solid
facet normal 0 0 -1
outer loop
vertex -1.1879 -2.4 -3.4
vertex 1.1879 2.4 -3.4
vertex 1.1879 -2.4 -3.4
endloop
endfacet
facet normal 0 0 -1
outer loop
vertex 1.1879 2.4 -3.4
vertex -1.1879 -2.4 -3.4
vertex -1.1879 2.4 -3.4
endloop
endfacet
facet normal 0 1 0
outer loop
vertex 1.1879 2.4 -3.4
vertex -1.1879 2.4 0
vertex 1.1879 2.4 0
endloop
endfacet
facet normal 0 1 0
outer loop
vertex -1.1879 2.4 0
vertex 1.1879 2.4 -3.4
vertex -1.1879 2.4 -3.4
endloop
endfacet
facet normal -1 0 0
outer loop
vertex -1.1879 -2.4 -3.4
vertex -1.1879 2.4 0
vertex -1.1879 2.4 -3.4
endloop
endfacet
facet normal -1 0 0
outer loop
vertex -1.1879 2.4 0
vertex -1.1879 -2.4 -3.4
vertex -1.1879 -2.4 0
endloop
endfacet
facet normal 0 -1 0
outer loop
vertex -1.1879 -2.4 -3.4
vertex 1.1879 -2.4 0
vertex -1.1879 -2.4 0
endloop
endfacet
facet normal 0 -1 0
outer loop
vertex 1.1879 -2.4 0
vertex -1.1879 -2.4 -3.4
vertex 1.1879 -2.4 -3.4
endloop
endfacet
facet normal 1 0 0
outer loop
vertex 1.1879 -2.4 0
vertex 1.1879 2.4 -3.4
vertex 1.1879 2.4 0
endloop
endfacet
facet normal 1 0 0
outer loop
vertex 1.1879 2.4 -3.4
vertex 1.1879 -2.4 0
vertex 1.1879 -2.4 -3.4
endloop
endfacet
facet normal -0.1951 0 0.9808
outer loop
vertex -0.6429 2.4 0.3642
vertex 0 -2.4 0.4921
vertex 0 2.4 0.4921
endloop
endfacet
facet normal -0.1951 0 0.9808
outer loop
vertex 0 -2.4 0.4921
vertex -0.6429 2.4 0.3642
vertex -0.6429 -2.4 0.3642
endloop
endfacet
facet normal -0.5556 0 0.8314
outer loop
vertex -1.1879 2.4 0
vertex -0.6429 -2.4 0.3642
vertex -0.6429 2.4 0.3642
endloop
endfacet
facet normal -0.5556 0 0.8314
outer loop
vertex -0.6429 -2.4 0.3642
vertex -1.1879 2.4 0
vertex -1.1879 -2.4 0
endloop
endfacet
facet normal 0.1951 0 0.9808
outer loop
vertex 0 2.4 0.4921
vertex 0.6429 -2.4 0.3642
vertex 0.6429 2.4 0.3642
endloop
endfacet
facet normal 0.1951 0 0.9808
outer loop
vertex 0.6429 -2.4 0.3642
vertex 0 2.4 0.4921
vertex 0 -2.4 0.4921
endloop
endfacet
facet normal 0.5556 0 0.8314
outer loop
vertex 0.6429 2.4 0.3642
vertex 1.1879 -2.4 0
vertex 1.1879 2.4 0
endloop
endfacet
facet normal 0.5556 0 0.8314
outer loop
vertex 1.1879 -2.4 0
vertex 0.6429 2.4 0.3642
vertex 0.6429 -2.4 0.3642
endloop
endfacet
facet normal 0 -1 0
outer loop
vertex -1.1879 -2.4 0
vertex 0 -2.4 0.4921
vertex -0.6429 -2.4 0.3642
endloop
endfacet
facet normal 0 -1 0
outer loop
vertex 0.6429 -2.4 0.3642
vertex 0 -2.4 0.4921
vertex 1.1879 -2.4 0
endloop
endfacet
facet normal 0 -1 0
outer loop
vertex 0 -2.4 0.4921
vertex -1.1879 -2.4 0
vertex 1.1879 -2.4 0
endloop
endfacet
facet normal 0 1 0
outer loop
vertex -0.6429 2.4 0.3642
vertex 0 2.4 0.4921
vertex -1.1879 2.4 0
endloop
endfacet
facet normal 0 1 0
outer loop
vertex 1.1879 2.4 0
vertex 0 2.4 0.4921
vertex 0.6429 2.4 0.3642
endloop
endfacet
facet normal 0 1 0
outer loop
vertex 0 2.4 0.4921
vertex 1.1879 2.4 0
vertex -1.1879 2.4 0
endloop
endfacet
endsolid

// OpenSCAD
// file: ../p/1-8edge.scad
use <../lib.scad>
function ldraw_lib__1_8edge() = [
// 0 Circle 0.125
// 0 Name: 1-8edge.dat
// 0 Author: James Jessiman
// 0 !LDRAW_ORG Primitive UPDATE 2017-01
// 0 !LICENSE Licensed under CC BY 2.0 and CC BY 4.0 : see CAreadme.txt
// 
// 0 BFC CERTIFY CCW
  [0,"BFC","CERTIFY"],
  [0,"BFC","CCW"],
// 
// 0 !HISTORY 2007-06-22 [PTadmin] Header formatted for Contributor Agreement
// 0 !HISTORY 2008-07-01 [PTadmin] Official Update 2008-01
// 0 !HISTORY 2017-01-15 [Steffen] BFCed
// 0 !HISTORY 2017-12-30 [PTadmin] Official Update 2017-01
// 
// 
// 2 24 1 0 0 0.9239 0 0.3827
  [2,24,1,0,0,0.9239,0,0.3827],
// 2 24 0.9239 0 0.3827 0.7071 0 0.7071
  [2,24,0.9239,0,0.3827,0.7071,0,0.7071],
];
module ldraw_lib__1_8edge(step=0, col=false, unit=2/5, alt=false, line=0.2, solid=!$preview)
    makepoly(ldraw_lib__1_8edge(), step=step, col=col, unit=unit, alt=alt, line=line, solid=solid);
ldraw_lib__1_8edge(line=0.2);
// file: ../p/1-8cyli.scad
use <../lib.scad>
function ldraw_lib__1_8cyli() = [
// 0 Cylinder 0.125
// 0 Name: 1-8cyli.dat
// 0 Author: James Jessiman
// 0 !LDRAW_ORG Primitive UPDATE 2005-01
// 0 !LICENSE Licensed under CC BY 2.0 and CC BY 4.0 : see CAreadme.txt
// 
// 0 BFC CERTIFY CCW
  [0,"BFC","CERTIFY"],
  [0,"BFC","CCW"],
// 
// 0 !HISTORY 2002-04-25 [PTadmin] Official Update 2002-02
// 0 !HISTORY 2004-12-11 [nielsk] Recreated using Primitive Generator, Edge lines fixed, BFC changed to CCW
// 0 !HISTORY 2005-12-28 [PTadmin] Official Update 2005-01
// 0 !HISTORY 2007-06-22 [PTadmin] Header formatted for Contributor Agreement
// 0 !HISTORY 2008-07-01 [PTadmin] Official Update 2008-01
// 
// 
// 4 16 .9239 1 .3827 .9239 0 .3827 1 0 0 1 1 0
  [4,16,.9239,1,.3827,.9239,0,.3827,1,0,0,1,1,0],
// 4 16 .7071 1 .7071 .7071 0 .7071 .9239 0 .3827 .9239 1 .3827
  [4,16,.7071,1,.7071,.7071,0,.7071,.9239,0,.3827,.9239,1,.3827],
// 5 24 1 1 0 1 0 0 1 1 -.4142 .9239 1 .3827
  [5,24,1,1,0,1,0,0,1,1,-.4142,.9239,1,.3827],
// 5 24 .9239 1 .3827 .9239 0 .3827 1 1 0 .7071 1 .7071
  [5,24,.9239,1,.3827,.9239,0,.3827,1,1,0,.7071,1,.7071],
// 5 24 .7071 1 .7071 .7071 0 .7071 .9239 1 .3827 .4142 1 1
  [5,24,.7071,1,.7071,.7071,0,.7071,.9239,1,.3827,.4142,1,1],
// 0
];
module ldraw_lib__1_8cyli(step=0, col=false, unit=2/5, alt=false, line=0.2, solid=!$preview)
    makepoly(ldraw_lib__1_8cyli(), step=step, col=col, unit=unit, alt=alt, line=line, solid=solid);
ldraw_lib__1_8cyli(line=0.2);
// file: ../p/box5-2p.scad
use <../lib.scad>
function ldraw_lib__box5_2p() = [
// 0 Box with 5 Faces without 2 Parallel Edges
// 0 Name: box5-2p.dat
// 0 Author: Joerg Sommerer [Brickaneer]
// 0 !LDRAW_ORG Primitive UPDATE 2012-01
// 0 !LICENSE Licensed under CC BY 2.0 and CC BY 4.0 : see CAreadme.txt
// 
// 0 BFC CERTIFY CCW
  [0,"BFC","CERTIFY"],
  [0,"BFC","CCW"],
// 
// 0 !HISTORY 2012-03-30 [PTadmin] Official Update 2012-01
// 
// 
// 2 24 1 1 1 -1 1 1
  [2,24,1,1,1,-1,1,1],
// 2 24 -1 1 1 -1 1 -1
  [2,24,-1,1,1,-1,1,-1],
// 2 24 -1 1 -1 1 1 -1
  [2,24,-1,1,-1,1,1,-1],
// 2 24 1 1 -1 1 1 1
  [2,24,1,1,-1,1,1,1],
// 2 24 1 0 1 1 1 1
  [2,24,1,0,1,1,1,1],
// 2 24 -1 0 1 -1 1 1
  [2,24,-1,0,1,-1,1,1],
// 2 24 1 0 -1 1 1 -1
  [2,24,1,0,-1,1,1,-1],
// 2 24 -1 0 -1 -1 1 -1
  [2,24,-1,0,-1,-1,1,-1],
// 2 24 -1 0 1 -1 0 -1
  [2,24,-1,0,1,-1,0,-1],
// 2 24 1 0 -1 1 0 1
  [2,24,1,0,-1,1,0,1],
// 4 16 1 1 -1 -1 1 -1 -1 1 1 1 1 1
  [4,16,1,1,-1,-1,1,-1,-1,1,1,1,1,1],
// 4 16 -1 1 1 -1 0 1 1 0 1 1 1 1
  [4,16,-1,1,1,-1,0,1,1,0,1,1,1,1],
// 4 16 -1 1 -1 -1 0 -1 -1 0 1 -1 1 1
  [4,16,-1,1,-1,-1,0,-1,-1,0,1,-1,1,1],
// 4 16 1 1 -1 1 0 -1 -1 0 -1 -1 1 -1
  [4,16,1,1,-1,1,0,-1,-1,0,-1,-1,1,-1],
// 4 16 1 1 1 1 0 1 1 0 -1 1 1 -1
  [4,16,1,1,1,1,0,1,1,0,-1,1,1,-1],
];
module ldraw_lib__box5_2p(step=0, col=false, unit=2/5, alt=false, line=0.2, solid=!$preview)
    makepoly(ldraw_lib__box5_2p(), step=step, col=col, unit=unit, alt=alt, line=line, solid=solid);
ldraw_lib__box5_2p(line=0.2);
// file: ../p/1-8cylo.scad
use <../lib.scad>
use <1-8cyli.scad>
use <1-8edge.scad>
function ldraw_lib__1_8cylo() = [
// 0 Cylinder Open 0.125
// 0 Name: 1-8cylo.dat
// 0 Author: Tim Gould [timgould]
// 0 !LDRAW_ORG Primitive UPDATE 2012-03
// 0 !LICENSE Licensed under CC BY 2.0 and CC BY 4.0 : see CAreadme.txt
// 
// 0 BFC CERTIFY CCW
  [0,"BFC","CERTIFY"],
  [0,"BFC","CCW"],
// 
// 0 !HISTORY 2012-12-28 [PTadmin] Official Update 2012-03
// 
// 
// 1 16 0 0 0 1 0 0 0 1 0 0 0 1 1-8edge.dat
  [1,16,0,0,0,1,0,0,0,1,0,0,0,1, ldraw_lib__1_8edge()],
// 1 16 0 1 0 1 0 0 0 1 0 0 0 1 1-8edge.dat
  [1,16,0,1,0,1,0,0,0,1,0,0,0,1, ldraw_lib__1_8edge()],
// 1 16 0 0 0 1 0 0 0 1 0 0 0 1 1-8cyli.dat
  [1,16,0,0,0,1,0,0,0,1,0,0,0,1, ldraw_lib__1_8cyli()],
];
module ldraw_lib__1_8cylo(step=0, col=false, unit=2/5, alt=false, line=0.2, solid=!$preview)
    makepoly(ldraw_lib__1_8cylo(), step=step, col=col, unit=unit, alt=alt, line=line, solid=solid);
ldraw_lib__1_8cylo(line=0.2);
// file: ../p/1-8chrd.scad
use <../lib.scad>
function ldraw_lib__1_8chrd() = [
// 0 Chord 0.125
// 0 Name: 1-8chrd.dat
// 0 Author: Andy Westrate [westrate]
// 0 !LDRAW_ORG Primitive UPDATE 2004-02
// 0 !LICENSE Licensed under CC BY 2.0 and CC BY 4.0 : see CAreadme.txt
// 
// 0 BFC CERTIFY CCW
  [0,"BFC","CERTIFY"],
  [0,"BFC","CCW"],
// 
// 0 !HISTORY 2004-04-22 [PTadmin] Official Update 2004-02
// 0 !HISTORY 2007-06-22 [PTadmin] Header formatted for Contributor Agreement
// 0 !HISTORY 2008-07-01 [PTadmin] Official Update 2008-01
// 
// 
// 3 16 0.7071 0 0.7071 1 0 0 0.9239 0 0.3827
  [3,16,0.7071,0,0.7071,1,0,0,0.9239,0,0.3827],
// 
// 0
];
module ldraw_lib__1_8chrd(step=0, col=false, unit=2/5, alt=false, line=0.2, solid=!$preview)
    makepoly(ldraw_lib__1_8chrd(), step=step, col=col, unit=unit, alt=alt, line=line, solid=solid);
ldraw_lib__1_8chrd(line=0.2);
// main file
use <../lib.scad>
use <../p/1-8chrd.scad>
use <../p/1-8cylo.scad>
use <../p/box5-2p.scad>
function ldraw_lib__t1069() = [
// 0 ~| Circuit Cubes NO/NC Switch Button
// 0 Name: t1069.dat
// 0 Author: Philippe Hurbain [Philo]
// 0 !LDRAW_ORG Part UPDATE 2022-05
// 0 !LICENSE Licensed under CC BY 2.0 and CC BY 4.0 : see CAreadme.txt
// 
// 0 BFC CERTIFY CCW
  [0,"BFC","CERTIFY"],
  [0,"BFC","CCW"],
// 
// 0 !CATEGORY Electric
// 
// 0 !HISTORY 2022-09-15 [PTadmin] Official Update 2022-05
// 
// 
// 1 16 0 0 0 2.96982 0 0 0 8.5 0 0 0 6 box5-2p.dat
  [1,16,0,0,0,2.96982,0,0,0,8.5,0,0,0,6, ldraw_lib__box5_2p()],
// 1 16 0 2.9698 -6 0 0 -4.2 -4.2 0 0 0 12 0 1-8cylo.dat
  [1,16,0,2.9698,-6,0,0,-4.2,-4.2,0,0,0,12,0, ldraw_lib__1_8cylo()],
// 1 16 0 2.9698 -6 0 0 4.2 -4.2 0 0 0 12 0 1-8cylo.dat
  [1,16,0,2.9698,-6,0,0,4.2,-4.2,0,0,0,12,0, ldraw_lib__1_8cylo()],
// 1 16 0 2.9698 -6 0 0 -4.2 -4.2 0 0 0 1 0 1-8chrd.dat
  [1,16,0,2.9698,-6,0,0,-4.2,-4.2,0,0,0,1,0, ldraw_lib__1_8chrd()],
// 1 16 0 2.9698 -6 0 0 4.2 -4.2 0 0 0 1 0 1-8chrd.dat
  [1,16,0,2.9698,-6,0,0,4.2,-4.2,0,0,0,1,0, ldraw_lib__1_8chrd()],
// 3 16 0 -1.2302 -6 -2.9698 0 -6 2.9698 0 -6
  [3,16,0,-1.2302,-6,-2.9698,0,-6,2.9698,0,-6],
// 1 16 0 2.9698 6 0 0 -4.2 -4.2 0 0 0 -1 0 1-8chrd.dat
  [1,16,0,2.9698,6,0,0,-4.2,-4.2,0,0,0,-1,0, ldraw_lib__1_8chrd()],
// 1 16 0 2.9698 6 0 0 4.2 -4.2 0 0 0 -1 0 1-8chrd.dat
  [1,16,0,2.9698,6,0,0,4.2,-4.2,0,0,0,-1,0, ldraw_lib__1_8chrd()],
// 3 16 0 -1.2302 6 2.9698 0 6 -2.9698 0 6
  [3,16,0,-1.2302,6,2.9698,0,6,-2.9698,0,6],
];
module ldraw_lib__t1069(step=0, col=false, unit=2/5, alt=false, line=0.2, solid=!$preview)
    makepoly(ldraw_lib__t1069(), step=step, col=col, unit=unit, alt=alt, line=line, solid=solid);
ldraw_lib__t1069(line=0.2);
